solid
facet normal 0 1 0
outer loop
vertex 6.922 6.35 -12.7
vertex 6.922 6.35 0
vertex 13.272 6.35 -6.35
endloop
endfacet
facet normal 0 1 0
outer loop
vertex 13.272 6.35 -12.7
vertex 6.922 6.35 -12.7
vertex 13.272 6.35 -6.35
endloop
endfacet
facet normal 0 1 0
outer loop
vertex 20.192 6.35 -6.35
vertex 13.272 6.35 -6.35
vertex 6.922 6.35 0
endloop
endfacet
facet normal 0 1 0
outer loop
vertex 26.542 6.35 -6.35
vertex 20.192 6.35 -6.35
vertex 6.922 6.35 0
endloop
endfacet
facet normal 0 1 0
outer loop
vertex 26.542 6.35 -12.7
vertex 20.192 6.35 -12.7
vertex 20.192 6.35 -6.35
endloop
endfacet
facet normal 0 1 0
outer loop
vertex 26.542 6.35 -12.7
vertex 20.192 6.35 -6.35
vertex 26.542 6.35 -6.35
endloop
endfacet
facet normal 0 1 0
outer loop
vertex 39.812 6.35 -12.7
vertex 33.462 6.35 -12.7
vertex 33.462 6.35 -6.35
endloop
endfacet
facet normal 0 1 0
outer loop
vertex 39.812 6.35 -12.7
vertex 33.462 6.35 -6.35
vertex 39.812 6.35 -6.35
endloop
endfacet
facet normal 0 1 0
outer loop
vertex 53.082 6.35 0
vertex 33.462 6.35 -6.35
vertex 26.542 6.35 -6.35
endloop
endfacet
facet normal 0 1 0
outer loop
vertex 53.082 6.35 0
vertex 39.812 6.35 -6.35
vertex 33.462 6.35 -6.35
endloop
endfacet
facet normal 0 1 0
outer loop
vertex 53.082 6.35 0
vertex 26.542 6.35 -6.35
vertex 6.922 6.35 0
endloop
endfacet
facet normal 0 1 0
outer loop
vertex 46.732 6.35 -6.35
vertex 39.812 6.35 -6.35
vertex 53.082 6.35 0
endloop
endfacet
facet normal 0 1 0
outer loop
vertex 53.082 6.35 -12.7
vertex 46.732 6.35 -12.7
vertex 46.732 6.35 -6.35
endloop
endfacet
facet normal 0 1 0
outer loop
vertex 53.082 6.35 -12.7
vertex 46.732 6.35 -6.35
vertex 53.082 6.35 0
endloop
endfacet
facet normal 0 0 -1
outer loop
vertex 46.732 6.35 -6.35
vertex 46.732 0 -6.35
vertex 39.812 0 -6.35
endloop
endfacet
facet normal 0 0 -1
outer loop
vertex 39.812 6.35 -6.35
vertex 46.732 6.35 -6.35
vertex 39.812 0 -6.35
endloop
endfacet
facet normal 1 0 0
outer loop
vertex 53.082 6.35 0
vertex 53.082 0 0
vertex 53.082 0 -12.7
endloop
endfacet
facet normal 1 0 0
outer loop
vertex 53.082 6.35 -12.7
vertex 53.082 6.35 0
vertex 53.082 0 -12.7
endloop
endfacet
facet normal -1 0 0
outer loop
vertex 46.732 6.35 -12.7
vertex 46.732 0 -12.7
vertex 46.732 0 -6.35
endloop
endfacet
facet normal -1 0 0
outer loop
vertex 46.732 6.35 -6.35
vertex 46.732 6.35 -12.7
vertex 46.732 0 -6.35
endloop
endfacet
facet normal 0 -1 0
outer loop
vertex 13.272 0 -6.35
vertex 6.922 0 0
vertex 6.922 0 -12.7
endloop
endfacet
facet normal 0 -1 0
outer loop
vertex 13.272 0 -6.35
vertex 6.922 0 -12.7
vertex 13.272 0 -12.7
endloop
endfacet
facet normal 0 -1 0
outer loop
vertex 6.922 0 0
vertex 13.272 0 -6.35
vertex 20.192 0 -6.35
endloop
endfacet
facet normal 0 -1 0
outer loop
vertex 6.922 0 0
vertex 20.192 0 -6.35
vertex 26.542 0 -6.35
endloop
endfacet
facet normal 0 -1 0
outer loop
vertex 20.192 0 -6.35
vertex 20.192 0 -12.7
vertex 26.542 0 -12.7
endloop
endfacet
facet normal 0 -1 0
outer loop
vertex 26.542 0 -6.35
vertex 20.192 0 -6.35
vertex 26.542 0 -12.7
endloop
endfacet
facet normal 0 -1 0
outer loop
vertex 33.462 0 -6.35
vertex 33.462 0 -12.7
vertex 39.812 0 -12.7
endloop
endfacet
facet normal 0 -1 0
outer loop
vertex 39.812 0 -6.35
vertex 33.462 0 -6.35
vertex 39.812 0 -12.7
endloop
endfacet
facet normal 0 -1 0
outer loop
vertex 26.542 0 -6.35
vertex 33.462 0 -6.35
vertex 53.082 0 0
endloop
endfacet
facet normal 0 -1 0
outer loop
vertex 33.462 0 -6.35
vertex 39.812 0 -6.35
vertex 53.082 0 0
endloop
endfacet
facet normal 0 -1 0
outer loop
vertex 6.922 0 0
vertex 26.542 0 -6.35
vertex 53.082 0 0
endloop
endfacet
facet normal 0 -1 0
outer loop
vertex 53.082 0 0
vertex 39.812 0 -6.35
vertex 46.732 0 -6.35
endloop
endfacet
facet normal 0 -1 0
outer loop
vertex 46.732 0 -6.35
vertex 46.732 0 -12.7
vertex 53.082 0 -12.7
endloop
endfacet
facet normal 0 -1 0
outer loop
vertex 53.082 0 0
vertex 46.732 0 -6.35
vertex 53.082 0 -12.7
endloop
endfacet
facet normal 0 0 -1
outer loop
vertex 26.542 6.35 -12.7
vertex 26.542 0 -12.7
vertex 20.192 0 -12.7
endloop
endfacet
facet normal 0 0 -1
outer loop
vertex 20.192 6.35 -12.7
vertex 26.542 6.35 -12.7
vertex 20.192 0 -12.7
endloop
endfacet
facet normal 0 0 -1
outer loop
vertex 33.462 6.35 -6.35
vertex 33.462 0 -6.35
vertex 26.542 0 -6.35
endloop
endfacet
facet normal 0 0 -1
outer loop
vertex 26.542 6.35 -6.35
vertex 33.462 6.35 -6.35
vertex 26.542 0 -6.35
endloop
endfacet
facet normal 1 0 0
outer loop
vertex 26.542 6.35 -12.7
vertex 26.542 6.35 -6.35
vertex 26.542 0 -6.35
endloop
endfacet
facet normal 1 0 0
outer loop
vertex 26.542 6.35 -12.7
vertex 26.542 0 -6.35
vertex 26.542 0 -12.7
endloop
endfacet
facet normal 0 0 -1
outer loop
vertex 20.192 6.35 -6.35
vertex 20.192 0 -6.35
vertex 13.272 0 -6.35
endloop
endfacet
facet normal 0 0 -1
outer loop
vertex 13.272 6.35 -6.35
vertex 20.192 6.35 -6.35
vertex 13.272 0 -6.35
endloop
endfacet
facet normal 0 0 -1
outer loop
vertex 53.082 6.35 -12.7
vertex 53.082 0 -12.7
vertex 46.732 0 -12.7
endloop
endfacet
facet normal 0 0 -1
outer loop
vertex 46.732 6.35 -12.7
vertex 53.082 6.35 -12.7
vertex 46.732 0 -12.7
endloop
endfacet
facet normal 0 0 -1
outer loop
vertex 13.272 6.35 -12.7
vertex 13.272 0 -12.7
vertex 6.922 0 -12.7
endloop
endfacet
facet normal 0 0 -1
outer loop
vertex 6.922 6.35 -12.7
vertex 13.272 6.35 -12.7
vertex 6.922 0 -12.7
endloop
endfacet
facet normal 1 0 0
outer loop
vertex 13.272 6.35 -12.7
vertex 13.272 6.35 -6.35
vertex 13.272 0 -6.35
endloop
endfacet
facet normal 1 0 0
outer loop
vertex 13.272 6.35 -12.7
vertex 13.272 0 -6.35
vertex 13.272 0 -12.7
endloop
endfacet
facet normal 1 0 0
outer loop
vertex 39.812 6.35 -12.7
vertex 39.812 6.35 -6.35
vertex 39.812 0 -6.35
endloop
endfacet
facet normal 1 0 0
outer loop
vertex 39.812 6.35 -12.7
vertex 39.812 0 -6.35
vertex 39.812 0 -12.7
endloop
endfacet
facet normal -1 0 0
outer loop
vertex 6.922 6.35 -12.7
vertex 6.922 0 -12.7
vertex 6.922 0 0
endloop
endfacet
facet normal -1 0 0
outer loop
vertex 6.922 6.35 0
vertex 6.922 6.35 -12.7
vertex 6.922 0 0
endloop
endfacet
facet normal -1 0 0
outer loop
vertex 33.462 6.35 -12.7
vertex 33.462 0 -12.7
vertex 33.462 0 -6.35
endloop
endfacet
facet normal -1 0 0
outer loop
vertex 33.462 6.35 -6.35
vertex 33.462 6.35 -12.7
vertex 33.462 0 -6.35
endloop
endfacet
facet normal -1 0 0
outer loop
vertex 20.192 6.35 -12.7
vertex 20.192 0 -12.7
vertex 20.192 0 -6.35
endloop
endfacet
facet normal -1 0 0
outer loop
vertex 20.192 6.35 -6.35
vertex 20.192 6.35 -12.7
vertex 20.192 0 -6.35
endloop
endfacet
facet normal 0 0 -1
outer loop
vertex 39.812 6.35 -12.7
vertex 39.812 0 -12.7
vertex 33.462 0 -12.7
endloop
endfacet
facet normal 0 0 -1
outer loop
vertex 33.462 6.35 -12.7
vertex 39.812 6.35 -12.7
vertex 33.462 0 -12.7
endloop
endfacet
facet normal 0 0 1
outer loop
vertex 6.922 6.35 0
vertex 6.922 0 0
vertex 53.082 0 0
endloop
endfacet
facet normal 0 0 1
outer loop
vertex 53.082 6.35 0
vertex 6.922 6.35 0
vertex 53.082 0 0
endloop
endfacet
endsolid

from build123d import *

# Parameters (mm, degrees)
BOSS_EXTRUDE1_DEPTH = 6.35


with BuildPart() as part:
    # Sketch1 → Boss-Extrude1 (new body)
    with BuildSketch(Plane(origin=(0, 0, 0), x_dir=(1, 0, 0), z_dir=(0, 1, 0))):
        Polygon((6.922, 6.35), (6.922, 0), (53.082, 0), (53.082, 6.35), (53.082, 12.7), (52.819416304, 12.7), (46.732, 12.7), (46.732, 6.35), (39.812, 6.35), (39.812, 12.7), (33.462, 12.7), (33.462, 6.35), (26.542, 6.35), (26.542, 12.7), (20.192, 12.7), (20.192, 6.35), (13.272, 6.35), (13.272, 12.7), (6.922, 12.7), align=None)
    extrude(amount=BOSS_EXTRUDE1_DEPTH)


solid = part.part
